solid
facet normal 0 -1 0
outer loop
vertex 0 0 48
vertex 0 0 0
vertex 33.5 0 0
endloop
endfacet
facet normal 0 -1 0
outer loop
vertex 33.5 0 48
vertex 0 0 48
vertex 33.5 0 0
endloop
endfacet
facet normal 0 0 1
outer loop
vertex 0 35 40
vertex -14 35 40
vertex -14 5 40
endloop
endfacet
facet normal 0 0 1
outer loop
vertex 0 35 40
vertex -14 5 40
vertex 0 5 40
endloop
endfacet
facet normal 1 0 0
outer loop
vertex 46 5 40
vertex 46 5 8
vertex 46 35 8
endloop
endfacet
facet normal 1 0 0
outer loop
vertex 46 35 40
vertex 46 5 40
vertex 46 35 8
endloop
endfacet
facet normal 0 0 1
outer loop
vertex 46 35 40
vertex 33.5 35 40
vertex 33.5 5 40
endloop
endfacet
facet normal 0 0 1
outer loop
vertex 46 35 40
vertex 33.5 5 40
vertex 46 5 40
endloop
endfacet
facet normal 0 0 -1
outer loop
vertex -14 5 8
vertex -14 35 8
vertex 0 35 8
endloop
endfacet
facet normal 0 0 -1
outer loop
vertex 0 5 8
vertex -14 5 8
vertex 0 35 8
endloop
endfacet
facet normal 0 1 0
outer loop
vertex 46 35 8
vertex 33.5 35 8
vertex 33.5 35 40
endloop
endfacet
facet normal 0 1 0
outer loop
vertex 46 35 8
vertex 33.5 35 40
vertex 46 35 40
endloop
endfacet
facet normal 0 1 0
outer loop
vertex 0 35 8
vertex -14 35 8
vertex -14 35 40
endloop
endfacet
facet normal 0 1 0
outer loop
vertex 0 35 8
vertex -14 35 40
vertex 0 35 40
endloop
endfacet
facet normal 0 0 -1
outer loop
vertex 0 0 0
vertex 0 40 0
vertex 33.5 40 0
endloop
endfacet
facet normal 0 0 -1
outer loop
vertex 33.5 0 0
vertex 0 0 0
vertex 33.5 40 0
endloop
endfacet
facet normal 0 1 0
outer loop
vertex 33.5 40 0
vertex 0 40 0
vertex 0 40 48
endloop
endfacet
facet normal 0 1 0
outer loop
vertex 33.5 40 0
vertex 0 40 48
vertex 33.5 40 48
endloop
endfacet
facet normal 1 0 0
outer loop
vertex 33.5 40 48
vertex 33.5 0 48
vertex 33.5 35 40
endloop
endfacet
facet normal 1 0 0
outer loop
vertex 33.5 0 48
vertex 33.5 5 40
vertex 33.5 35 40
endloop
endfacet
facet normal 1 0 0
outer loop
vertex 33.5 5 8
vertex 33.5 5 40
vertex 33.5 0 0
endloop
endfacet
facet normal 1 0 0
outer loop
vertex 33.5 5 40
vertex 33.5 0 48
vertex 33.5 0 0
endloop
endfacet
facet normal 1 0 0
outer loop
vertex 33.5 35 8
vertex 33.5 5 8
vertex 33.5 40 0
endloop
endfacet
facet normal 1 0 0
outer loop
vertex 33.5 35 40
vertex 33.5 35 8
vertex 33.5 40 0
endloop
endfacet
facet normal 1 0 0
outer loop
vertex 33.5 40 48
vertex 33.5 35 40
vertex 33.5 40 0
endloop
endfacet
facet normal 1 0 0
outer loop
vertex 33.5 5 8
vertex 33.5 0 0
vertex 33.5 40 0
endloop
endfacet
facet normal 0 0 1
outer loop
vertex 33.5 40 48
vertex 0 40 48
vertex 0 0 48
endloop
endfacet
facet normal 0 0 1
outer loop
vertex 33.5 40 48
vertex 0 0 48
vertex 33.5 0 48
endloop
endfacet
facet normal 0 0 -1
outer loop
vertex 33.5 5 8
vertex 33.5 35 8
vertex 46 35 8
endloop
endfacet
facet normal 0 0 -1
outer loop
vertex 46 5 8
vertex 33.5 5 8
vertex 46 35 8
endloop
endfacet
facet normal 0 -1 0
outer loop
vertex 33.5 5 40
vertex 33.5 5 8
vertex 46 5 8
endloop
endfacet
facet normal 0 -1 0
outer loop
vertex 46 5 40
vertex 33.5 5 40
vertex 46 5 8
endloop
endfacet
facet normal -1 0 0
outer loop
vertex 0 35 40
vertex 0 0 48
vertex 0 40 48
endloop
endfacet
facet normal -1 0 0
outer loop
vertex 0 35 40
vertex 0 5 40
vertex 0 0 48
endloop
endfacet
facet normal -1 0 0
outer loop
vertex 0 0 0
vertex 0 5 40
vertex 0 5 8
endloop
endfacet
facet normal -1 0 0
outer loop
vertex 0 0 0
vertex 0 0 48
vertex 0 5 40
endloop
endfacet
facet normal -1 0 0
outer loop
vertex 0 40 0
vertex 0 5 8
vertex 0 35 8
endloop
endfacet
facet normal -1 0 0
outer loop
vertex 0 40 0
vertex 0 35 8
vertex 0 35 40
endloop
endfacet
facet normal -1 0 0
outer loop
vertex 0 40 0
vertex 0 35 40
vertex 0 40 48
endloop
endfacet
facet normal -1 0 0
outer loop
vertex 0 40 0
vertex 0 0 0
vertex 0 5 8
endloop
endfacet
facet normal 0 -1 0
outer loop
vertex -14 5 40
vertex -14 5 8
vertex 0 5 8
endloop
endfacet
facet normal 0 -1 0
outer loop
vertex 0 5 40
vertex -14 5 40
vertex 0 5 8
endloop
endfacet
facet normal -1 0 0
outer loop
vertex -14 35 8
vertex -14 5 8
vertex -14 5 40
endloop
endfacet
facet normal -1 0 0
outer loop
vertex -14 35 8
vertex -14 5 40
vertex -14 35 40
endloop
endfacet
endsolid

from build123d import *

# Parameters (mm, degrees)
BOX001_W     = 60
BOX001_H     = 30
BOX001_DEPTH = 32
BOX_W        = 33.5
BOX_H        = 40
BOX_DEPTH    = 48


with BuildPart() as box001:
    # Box001 → Box001 (new body)
    with BuildSketch(Plane(origin=(-14, 5, 8), x_dir=(1, 0, 0), z_dir=(0, 0, 1))):
        with Locations((30, 15)):
            Rectangle(BOX001_W, BOX001_H)
    extrude(amount=BOX001_DEPTH)


with BuildPart() as tfusion:
    # Box → Box (new body)
    with BuildSketch(Plane.XY):
        with Locations((16.75, 20)):
            Rectangle(BOX_W, BOX_H)
    extrude(amount=BOX_DEPTH)

    # Fusion: union Box001
    add(box001.part)


solid = tfusion.part
